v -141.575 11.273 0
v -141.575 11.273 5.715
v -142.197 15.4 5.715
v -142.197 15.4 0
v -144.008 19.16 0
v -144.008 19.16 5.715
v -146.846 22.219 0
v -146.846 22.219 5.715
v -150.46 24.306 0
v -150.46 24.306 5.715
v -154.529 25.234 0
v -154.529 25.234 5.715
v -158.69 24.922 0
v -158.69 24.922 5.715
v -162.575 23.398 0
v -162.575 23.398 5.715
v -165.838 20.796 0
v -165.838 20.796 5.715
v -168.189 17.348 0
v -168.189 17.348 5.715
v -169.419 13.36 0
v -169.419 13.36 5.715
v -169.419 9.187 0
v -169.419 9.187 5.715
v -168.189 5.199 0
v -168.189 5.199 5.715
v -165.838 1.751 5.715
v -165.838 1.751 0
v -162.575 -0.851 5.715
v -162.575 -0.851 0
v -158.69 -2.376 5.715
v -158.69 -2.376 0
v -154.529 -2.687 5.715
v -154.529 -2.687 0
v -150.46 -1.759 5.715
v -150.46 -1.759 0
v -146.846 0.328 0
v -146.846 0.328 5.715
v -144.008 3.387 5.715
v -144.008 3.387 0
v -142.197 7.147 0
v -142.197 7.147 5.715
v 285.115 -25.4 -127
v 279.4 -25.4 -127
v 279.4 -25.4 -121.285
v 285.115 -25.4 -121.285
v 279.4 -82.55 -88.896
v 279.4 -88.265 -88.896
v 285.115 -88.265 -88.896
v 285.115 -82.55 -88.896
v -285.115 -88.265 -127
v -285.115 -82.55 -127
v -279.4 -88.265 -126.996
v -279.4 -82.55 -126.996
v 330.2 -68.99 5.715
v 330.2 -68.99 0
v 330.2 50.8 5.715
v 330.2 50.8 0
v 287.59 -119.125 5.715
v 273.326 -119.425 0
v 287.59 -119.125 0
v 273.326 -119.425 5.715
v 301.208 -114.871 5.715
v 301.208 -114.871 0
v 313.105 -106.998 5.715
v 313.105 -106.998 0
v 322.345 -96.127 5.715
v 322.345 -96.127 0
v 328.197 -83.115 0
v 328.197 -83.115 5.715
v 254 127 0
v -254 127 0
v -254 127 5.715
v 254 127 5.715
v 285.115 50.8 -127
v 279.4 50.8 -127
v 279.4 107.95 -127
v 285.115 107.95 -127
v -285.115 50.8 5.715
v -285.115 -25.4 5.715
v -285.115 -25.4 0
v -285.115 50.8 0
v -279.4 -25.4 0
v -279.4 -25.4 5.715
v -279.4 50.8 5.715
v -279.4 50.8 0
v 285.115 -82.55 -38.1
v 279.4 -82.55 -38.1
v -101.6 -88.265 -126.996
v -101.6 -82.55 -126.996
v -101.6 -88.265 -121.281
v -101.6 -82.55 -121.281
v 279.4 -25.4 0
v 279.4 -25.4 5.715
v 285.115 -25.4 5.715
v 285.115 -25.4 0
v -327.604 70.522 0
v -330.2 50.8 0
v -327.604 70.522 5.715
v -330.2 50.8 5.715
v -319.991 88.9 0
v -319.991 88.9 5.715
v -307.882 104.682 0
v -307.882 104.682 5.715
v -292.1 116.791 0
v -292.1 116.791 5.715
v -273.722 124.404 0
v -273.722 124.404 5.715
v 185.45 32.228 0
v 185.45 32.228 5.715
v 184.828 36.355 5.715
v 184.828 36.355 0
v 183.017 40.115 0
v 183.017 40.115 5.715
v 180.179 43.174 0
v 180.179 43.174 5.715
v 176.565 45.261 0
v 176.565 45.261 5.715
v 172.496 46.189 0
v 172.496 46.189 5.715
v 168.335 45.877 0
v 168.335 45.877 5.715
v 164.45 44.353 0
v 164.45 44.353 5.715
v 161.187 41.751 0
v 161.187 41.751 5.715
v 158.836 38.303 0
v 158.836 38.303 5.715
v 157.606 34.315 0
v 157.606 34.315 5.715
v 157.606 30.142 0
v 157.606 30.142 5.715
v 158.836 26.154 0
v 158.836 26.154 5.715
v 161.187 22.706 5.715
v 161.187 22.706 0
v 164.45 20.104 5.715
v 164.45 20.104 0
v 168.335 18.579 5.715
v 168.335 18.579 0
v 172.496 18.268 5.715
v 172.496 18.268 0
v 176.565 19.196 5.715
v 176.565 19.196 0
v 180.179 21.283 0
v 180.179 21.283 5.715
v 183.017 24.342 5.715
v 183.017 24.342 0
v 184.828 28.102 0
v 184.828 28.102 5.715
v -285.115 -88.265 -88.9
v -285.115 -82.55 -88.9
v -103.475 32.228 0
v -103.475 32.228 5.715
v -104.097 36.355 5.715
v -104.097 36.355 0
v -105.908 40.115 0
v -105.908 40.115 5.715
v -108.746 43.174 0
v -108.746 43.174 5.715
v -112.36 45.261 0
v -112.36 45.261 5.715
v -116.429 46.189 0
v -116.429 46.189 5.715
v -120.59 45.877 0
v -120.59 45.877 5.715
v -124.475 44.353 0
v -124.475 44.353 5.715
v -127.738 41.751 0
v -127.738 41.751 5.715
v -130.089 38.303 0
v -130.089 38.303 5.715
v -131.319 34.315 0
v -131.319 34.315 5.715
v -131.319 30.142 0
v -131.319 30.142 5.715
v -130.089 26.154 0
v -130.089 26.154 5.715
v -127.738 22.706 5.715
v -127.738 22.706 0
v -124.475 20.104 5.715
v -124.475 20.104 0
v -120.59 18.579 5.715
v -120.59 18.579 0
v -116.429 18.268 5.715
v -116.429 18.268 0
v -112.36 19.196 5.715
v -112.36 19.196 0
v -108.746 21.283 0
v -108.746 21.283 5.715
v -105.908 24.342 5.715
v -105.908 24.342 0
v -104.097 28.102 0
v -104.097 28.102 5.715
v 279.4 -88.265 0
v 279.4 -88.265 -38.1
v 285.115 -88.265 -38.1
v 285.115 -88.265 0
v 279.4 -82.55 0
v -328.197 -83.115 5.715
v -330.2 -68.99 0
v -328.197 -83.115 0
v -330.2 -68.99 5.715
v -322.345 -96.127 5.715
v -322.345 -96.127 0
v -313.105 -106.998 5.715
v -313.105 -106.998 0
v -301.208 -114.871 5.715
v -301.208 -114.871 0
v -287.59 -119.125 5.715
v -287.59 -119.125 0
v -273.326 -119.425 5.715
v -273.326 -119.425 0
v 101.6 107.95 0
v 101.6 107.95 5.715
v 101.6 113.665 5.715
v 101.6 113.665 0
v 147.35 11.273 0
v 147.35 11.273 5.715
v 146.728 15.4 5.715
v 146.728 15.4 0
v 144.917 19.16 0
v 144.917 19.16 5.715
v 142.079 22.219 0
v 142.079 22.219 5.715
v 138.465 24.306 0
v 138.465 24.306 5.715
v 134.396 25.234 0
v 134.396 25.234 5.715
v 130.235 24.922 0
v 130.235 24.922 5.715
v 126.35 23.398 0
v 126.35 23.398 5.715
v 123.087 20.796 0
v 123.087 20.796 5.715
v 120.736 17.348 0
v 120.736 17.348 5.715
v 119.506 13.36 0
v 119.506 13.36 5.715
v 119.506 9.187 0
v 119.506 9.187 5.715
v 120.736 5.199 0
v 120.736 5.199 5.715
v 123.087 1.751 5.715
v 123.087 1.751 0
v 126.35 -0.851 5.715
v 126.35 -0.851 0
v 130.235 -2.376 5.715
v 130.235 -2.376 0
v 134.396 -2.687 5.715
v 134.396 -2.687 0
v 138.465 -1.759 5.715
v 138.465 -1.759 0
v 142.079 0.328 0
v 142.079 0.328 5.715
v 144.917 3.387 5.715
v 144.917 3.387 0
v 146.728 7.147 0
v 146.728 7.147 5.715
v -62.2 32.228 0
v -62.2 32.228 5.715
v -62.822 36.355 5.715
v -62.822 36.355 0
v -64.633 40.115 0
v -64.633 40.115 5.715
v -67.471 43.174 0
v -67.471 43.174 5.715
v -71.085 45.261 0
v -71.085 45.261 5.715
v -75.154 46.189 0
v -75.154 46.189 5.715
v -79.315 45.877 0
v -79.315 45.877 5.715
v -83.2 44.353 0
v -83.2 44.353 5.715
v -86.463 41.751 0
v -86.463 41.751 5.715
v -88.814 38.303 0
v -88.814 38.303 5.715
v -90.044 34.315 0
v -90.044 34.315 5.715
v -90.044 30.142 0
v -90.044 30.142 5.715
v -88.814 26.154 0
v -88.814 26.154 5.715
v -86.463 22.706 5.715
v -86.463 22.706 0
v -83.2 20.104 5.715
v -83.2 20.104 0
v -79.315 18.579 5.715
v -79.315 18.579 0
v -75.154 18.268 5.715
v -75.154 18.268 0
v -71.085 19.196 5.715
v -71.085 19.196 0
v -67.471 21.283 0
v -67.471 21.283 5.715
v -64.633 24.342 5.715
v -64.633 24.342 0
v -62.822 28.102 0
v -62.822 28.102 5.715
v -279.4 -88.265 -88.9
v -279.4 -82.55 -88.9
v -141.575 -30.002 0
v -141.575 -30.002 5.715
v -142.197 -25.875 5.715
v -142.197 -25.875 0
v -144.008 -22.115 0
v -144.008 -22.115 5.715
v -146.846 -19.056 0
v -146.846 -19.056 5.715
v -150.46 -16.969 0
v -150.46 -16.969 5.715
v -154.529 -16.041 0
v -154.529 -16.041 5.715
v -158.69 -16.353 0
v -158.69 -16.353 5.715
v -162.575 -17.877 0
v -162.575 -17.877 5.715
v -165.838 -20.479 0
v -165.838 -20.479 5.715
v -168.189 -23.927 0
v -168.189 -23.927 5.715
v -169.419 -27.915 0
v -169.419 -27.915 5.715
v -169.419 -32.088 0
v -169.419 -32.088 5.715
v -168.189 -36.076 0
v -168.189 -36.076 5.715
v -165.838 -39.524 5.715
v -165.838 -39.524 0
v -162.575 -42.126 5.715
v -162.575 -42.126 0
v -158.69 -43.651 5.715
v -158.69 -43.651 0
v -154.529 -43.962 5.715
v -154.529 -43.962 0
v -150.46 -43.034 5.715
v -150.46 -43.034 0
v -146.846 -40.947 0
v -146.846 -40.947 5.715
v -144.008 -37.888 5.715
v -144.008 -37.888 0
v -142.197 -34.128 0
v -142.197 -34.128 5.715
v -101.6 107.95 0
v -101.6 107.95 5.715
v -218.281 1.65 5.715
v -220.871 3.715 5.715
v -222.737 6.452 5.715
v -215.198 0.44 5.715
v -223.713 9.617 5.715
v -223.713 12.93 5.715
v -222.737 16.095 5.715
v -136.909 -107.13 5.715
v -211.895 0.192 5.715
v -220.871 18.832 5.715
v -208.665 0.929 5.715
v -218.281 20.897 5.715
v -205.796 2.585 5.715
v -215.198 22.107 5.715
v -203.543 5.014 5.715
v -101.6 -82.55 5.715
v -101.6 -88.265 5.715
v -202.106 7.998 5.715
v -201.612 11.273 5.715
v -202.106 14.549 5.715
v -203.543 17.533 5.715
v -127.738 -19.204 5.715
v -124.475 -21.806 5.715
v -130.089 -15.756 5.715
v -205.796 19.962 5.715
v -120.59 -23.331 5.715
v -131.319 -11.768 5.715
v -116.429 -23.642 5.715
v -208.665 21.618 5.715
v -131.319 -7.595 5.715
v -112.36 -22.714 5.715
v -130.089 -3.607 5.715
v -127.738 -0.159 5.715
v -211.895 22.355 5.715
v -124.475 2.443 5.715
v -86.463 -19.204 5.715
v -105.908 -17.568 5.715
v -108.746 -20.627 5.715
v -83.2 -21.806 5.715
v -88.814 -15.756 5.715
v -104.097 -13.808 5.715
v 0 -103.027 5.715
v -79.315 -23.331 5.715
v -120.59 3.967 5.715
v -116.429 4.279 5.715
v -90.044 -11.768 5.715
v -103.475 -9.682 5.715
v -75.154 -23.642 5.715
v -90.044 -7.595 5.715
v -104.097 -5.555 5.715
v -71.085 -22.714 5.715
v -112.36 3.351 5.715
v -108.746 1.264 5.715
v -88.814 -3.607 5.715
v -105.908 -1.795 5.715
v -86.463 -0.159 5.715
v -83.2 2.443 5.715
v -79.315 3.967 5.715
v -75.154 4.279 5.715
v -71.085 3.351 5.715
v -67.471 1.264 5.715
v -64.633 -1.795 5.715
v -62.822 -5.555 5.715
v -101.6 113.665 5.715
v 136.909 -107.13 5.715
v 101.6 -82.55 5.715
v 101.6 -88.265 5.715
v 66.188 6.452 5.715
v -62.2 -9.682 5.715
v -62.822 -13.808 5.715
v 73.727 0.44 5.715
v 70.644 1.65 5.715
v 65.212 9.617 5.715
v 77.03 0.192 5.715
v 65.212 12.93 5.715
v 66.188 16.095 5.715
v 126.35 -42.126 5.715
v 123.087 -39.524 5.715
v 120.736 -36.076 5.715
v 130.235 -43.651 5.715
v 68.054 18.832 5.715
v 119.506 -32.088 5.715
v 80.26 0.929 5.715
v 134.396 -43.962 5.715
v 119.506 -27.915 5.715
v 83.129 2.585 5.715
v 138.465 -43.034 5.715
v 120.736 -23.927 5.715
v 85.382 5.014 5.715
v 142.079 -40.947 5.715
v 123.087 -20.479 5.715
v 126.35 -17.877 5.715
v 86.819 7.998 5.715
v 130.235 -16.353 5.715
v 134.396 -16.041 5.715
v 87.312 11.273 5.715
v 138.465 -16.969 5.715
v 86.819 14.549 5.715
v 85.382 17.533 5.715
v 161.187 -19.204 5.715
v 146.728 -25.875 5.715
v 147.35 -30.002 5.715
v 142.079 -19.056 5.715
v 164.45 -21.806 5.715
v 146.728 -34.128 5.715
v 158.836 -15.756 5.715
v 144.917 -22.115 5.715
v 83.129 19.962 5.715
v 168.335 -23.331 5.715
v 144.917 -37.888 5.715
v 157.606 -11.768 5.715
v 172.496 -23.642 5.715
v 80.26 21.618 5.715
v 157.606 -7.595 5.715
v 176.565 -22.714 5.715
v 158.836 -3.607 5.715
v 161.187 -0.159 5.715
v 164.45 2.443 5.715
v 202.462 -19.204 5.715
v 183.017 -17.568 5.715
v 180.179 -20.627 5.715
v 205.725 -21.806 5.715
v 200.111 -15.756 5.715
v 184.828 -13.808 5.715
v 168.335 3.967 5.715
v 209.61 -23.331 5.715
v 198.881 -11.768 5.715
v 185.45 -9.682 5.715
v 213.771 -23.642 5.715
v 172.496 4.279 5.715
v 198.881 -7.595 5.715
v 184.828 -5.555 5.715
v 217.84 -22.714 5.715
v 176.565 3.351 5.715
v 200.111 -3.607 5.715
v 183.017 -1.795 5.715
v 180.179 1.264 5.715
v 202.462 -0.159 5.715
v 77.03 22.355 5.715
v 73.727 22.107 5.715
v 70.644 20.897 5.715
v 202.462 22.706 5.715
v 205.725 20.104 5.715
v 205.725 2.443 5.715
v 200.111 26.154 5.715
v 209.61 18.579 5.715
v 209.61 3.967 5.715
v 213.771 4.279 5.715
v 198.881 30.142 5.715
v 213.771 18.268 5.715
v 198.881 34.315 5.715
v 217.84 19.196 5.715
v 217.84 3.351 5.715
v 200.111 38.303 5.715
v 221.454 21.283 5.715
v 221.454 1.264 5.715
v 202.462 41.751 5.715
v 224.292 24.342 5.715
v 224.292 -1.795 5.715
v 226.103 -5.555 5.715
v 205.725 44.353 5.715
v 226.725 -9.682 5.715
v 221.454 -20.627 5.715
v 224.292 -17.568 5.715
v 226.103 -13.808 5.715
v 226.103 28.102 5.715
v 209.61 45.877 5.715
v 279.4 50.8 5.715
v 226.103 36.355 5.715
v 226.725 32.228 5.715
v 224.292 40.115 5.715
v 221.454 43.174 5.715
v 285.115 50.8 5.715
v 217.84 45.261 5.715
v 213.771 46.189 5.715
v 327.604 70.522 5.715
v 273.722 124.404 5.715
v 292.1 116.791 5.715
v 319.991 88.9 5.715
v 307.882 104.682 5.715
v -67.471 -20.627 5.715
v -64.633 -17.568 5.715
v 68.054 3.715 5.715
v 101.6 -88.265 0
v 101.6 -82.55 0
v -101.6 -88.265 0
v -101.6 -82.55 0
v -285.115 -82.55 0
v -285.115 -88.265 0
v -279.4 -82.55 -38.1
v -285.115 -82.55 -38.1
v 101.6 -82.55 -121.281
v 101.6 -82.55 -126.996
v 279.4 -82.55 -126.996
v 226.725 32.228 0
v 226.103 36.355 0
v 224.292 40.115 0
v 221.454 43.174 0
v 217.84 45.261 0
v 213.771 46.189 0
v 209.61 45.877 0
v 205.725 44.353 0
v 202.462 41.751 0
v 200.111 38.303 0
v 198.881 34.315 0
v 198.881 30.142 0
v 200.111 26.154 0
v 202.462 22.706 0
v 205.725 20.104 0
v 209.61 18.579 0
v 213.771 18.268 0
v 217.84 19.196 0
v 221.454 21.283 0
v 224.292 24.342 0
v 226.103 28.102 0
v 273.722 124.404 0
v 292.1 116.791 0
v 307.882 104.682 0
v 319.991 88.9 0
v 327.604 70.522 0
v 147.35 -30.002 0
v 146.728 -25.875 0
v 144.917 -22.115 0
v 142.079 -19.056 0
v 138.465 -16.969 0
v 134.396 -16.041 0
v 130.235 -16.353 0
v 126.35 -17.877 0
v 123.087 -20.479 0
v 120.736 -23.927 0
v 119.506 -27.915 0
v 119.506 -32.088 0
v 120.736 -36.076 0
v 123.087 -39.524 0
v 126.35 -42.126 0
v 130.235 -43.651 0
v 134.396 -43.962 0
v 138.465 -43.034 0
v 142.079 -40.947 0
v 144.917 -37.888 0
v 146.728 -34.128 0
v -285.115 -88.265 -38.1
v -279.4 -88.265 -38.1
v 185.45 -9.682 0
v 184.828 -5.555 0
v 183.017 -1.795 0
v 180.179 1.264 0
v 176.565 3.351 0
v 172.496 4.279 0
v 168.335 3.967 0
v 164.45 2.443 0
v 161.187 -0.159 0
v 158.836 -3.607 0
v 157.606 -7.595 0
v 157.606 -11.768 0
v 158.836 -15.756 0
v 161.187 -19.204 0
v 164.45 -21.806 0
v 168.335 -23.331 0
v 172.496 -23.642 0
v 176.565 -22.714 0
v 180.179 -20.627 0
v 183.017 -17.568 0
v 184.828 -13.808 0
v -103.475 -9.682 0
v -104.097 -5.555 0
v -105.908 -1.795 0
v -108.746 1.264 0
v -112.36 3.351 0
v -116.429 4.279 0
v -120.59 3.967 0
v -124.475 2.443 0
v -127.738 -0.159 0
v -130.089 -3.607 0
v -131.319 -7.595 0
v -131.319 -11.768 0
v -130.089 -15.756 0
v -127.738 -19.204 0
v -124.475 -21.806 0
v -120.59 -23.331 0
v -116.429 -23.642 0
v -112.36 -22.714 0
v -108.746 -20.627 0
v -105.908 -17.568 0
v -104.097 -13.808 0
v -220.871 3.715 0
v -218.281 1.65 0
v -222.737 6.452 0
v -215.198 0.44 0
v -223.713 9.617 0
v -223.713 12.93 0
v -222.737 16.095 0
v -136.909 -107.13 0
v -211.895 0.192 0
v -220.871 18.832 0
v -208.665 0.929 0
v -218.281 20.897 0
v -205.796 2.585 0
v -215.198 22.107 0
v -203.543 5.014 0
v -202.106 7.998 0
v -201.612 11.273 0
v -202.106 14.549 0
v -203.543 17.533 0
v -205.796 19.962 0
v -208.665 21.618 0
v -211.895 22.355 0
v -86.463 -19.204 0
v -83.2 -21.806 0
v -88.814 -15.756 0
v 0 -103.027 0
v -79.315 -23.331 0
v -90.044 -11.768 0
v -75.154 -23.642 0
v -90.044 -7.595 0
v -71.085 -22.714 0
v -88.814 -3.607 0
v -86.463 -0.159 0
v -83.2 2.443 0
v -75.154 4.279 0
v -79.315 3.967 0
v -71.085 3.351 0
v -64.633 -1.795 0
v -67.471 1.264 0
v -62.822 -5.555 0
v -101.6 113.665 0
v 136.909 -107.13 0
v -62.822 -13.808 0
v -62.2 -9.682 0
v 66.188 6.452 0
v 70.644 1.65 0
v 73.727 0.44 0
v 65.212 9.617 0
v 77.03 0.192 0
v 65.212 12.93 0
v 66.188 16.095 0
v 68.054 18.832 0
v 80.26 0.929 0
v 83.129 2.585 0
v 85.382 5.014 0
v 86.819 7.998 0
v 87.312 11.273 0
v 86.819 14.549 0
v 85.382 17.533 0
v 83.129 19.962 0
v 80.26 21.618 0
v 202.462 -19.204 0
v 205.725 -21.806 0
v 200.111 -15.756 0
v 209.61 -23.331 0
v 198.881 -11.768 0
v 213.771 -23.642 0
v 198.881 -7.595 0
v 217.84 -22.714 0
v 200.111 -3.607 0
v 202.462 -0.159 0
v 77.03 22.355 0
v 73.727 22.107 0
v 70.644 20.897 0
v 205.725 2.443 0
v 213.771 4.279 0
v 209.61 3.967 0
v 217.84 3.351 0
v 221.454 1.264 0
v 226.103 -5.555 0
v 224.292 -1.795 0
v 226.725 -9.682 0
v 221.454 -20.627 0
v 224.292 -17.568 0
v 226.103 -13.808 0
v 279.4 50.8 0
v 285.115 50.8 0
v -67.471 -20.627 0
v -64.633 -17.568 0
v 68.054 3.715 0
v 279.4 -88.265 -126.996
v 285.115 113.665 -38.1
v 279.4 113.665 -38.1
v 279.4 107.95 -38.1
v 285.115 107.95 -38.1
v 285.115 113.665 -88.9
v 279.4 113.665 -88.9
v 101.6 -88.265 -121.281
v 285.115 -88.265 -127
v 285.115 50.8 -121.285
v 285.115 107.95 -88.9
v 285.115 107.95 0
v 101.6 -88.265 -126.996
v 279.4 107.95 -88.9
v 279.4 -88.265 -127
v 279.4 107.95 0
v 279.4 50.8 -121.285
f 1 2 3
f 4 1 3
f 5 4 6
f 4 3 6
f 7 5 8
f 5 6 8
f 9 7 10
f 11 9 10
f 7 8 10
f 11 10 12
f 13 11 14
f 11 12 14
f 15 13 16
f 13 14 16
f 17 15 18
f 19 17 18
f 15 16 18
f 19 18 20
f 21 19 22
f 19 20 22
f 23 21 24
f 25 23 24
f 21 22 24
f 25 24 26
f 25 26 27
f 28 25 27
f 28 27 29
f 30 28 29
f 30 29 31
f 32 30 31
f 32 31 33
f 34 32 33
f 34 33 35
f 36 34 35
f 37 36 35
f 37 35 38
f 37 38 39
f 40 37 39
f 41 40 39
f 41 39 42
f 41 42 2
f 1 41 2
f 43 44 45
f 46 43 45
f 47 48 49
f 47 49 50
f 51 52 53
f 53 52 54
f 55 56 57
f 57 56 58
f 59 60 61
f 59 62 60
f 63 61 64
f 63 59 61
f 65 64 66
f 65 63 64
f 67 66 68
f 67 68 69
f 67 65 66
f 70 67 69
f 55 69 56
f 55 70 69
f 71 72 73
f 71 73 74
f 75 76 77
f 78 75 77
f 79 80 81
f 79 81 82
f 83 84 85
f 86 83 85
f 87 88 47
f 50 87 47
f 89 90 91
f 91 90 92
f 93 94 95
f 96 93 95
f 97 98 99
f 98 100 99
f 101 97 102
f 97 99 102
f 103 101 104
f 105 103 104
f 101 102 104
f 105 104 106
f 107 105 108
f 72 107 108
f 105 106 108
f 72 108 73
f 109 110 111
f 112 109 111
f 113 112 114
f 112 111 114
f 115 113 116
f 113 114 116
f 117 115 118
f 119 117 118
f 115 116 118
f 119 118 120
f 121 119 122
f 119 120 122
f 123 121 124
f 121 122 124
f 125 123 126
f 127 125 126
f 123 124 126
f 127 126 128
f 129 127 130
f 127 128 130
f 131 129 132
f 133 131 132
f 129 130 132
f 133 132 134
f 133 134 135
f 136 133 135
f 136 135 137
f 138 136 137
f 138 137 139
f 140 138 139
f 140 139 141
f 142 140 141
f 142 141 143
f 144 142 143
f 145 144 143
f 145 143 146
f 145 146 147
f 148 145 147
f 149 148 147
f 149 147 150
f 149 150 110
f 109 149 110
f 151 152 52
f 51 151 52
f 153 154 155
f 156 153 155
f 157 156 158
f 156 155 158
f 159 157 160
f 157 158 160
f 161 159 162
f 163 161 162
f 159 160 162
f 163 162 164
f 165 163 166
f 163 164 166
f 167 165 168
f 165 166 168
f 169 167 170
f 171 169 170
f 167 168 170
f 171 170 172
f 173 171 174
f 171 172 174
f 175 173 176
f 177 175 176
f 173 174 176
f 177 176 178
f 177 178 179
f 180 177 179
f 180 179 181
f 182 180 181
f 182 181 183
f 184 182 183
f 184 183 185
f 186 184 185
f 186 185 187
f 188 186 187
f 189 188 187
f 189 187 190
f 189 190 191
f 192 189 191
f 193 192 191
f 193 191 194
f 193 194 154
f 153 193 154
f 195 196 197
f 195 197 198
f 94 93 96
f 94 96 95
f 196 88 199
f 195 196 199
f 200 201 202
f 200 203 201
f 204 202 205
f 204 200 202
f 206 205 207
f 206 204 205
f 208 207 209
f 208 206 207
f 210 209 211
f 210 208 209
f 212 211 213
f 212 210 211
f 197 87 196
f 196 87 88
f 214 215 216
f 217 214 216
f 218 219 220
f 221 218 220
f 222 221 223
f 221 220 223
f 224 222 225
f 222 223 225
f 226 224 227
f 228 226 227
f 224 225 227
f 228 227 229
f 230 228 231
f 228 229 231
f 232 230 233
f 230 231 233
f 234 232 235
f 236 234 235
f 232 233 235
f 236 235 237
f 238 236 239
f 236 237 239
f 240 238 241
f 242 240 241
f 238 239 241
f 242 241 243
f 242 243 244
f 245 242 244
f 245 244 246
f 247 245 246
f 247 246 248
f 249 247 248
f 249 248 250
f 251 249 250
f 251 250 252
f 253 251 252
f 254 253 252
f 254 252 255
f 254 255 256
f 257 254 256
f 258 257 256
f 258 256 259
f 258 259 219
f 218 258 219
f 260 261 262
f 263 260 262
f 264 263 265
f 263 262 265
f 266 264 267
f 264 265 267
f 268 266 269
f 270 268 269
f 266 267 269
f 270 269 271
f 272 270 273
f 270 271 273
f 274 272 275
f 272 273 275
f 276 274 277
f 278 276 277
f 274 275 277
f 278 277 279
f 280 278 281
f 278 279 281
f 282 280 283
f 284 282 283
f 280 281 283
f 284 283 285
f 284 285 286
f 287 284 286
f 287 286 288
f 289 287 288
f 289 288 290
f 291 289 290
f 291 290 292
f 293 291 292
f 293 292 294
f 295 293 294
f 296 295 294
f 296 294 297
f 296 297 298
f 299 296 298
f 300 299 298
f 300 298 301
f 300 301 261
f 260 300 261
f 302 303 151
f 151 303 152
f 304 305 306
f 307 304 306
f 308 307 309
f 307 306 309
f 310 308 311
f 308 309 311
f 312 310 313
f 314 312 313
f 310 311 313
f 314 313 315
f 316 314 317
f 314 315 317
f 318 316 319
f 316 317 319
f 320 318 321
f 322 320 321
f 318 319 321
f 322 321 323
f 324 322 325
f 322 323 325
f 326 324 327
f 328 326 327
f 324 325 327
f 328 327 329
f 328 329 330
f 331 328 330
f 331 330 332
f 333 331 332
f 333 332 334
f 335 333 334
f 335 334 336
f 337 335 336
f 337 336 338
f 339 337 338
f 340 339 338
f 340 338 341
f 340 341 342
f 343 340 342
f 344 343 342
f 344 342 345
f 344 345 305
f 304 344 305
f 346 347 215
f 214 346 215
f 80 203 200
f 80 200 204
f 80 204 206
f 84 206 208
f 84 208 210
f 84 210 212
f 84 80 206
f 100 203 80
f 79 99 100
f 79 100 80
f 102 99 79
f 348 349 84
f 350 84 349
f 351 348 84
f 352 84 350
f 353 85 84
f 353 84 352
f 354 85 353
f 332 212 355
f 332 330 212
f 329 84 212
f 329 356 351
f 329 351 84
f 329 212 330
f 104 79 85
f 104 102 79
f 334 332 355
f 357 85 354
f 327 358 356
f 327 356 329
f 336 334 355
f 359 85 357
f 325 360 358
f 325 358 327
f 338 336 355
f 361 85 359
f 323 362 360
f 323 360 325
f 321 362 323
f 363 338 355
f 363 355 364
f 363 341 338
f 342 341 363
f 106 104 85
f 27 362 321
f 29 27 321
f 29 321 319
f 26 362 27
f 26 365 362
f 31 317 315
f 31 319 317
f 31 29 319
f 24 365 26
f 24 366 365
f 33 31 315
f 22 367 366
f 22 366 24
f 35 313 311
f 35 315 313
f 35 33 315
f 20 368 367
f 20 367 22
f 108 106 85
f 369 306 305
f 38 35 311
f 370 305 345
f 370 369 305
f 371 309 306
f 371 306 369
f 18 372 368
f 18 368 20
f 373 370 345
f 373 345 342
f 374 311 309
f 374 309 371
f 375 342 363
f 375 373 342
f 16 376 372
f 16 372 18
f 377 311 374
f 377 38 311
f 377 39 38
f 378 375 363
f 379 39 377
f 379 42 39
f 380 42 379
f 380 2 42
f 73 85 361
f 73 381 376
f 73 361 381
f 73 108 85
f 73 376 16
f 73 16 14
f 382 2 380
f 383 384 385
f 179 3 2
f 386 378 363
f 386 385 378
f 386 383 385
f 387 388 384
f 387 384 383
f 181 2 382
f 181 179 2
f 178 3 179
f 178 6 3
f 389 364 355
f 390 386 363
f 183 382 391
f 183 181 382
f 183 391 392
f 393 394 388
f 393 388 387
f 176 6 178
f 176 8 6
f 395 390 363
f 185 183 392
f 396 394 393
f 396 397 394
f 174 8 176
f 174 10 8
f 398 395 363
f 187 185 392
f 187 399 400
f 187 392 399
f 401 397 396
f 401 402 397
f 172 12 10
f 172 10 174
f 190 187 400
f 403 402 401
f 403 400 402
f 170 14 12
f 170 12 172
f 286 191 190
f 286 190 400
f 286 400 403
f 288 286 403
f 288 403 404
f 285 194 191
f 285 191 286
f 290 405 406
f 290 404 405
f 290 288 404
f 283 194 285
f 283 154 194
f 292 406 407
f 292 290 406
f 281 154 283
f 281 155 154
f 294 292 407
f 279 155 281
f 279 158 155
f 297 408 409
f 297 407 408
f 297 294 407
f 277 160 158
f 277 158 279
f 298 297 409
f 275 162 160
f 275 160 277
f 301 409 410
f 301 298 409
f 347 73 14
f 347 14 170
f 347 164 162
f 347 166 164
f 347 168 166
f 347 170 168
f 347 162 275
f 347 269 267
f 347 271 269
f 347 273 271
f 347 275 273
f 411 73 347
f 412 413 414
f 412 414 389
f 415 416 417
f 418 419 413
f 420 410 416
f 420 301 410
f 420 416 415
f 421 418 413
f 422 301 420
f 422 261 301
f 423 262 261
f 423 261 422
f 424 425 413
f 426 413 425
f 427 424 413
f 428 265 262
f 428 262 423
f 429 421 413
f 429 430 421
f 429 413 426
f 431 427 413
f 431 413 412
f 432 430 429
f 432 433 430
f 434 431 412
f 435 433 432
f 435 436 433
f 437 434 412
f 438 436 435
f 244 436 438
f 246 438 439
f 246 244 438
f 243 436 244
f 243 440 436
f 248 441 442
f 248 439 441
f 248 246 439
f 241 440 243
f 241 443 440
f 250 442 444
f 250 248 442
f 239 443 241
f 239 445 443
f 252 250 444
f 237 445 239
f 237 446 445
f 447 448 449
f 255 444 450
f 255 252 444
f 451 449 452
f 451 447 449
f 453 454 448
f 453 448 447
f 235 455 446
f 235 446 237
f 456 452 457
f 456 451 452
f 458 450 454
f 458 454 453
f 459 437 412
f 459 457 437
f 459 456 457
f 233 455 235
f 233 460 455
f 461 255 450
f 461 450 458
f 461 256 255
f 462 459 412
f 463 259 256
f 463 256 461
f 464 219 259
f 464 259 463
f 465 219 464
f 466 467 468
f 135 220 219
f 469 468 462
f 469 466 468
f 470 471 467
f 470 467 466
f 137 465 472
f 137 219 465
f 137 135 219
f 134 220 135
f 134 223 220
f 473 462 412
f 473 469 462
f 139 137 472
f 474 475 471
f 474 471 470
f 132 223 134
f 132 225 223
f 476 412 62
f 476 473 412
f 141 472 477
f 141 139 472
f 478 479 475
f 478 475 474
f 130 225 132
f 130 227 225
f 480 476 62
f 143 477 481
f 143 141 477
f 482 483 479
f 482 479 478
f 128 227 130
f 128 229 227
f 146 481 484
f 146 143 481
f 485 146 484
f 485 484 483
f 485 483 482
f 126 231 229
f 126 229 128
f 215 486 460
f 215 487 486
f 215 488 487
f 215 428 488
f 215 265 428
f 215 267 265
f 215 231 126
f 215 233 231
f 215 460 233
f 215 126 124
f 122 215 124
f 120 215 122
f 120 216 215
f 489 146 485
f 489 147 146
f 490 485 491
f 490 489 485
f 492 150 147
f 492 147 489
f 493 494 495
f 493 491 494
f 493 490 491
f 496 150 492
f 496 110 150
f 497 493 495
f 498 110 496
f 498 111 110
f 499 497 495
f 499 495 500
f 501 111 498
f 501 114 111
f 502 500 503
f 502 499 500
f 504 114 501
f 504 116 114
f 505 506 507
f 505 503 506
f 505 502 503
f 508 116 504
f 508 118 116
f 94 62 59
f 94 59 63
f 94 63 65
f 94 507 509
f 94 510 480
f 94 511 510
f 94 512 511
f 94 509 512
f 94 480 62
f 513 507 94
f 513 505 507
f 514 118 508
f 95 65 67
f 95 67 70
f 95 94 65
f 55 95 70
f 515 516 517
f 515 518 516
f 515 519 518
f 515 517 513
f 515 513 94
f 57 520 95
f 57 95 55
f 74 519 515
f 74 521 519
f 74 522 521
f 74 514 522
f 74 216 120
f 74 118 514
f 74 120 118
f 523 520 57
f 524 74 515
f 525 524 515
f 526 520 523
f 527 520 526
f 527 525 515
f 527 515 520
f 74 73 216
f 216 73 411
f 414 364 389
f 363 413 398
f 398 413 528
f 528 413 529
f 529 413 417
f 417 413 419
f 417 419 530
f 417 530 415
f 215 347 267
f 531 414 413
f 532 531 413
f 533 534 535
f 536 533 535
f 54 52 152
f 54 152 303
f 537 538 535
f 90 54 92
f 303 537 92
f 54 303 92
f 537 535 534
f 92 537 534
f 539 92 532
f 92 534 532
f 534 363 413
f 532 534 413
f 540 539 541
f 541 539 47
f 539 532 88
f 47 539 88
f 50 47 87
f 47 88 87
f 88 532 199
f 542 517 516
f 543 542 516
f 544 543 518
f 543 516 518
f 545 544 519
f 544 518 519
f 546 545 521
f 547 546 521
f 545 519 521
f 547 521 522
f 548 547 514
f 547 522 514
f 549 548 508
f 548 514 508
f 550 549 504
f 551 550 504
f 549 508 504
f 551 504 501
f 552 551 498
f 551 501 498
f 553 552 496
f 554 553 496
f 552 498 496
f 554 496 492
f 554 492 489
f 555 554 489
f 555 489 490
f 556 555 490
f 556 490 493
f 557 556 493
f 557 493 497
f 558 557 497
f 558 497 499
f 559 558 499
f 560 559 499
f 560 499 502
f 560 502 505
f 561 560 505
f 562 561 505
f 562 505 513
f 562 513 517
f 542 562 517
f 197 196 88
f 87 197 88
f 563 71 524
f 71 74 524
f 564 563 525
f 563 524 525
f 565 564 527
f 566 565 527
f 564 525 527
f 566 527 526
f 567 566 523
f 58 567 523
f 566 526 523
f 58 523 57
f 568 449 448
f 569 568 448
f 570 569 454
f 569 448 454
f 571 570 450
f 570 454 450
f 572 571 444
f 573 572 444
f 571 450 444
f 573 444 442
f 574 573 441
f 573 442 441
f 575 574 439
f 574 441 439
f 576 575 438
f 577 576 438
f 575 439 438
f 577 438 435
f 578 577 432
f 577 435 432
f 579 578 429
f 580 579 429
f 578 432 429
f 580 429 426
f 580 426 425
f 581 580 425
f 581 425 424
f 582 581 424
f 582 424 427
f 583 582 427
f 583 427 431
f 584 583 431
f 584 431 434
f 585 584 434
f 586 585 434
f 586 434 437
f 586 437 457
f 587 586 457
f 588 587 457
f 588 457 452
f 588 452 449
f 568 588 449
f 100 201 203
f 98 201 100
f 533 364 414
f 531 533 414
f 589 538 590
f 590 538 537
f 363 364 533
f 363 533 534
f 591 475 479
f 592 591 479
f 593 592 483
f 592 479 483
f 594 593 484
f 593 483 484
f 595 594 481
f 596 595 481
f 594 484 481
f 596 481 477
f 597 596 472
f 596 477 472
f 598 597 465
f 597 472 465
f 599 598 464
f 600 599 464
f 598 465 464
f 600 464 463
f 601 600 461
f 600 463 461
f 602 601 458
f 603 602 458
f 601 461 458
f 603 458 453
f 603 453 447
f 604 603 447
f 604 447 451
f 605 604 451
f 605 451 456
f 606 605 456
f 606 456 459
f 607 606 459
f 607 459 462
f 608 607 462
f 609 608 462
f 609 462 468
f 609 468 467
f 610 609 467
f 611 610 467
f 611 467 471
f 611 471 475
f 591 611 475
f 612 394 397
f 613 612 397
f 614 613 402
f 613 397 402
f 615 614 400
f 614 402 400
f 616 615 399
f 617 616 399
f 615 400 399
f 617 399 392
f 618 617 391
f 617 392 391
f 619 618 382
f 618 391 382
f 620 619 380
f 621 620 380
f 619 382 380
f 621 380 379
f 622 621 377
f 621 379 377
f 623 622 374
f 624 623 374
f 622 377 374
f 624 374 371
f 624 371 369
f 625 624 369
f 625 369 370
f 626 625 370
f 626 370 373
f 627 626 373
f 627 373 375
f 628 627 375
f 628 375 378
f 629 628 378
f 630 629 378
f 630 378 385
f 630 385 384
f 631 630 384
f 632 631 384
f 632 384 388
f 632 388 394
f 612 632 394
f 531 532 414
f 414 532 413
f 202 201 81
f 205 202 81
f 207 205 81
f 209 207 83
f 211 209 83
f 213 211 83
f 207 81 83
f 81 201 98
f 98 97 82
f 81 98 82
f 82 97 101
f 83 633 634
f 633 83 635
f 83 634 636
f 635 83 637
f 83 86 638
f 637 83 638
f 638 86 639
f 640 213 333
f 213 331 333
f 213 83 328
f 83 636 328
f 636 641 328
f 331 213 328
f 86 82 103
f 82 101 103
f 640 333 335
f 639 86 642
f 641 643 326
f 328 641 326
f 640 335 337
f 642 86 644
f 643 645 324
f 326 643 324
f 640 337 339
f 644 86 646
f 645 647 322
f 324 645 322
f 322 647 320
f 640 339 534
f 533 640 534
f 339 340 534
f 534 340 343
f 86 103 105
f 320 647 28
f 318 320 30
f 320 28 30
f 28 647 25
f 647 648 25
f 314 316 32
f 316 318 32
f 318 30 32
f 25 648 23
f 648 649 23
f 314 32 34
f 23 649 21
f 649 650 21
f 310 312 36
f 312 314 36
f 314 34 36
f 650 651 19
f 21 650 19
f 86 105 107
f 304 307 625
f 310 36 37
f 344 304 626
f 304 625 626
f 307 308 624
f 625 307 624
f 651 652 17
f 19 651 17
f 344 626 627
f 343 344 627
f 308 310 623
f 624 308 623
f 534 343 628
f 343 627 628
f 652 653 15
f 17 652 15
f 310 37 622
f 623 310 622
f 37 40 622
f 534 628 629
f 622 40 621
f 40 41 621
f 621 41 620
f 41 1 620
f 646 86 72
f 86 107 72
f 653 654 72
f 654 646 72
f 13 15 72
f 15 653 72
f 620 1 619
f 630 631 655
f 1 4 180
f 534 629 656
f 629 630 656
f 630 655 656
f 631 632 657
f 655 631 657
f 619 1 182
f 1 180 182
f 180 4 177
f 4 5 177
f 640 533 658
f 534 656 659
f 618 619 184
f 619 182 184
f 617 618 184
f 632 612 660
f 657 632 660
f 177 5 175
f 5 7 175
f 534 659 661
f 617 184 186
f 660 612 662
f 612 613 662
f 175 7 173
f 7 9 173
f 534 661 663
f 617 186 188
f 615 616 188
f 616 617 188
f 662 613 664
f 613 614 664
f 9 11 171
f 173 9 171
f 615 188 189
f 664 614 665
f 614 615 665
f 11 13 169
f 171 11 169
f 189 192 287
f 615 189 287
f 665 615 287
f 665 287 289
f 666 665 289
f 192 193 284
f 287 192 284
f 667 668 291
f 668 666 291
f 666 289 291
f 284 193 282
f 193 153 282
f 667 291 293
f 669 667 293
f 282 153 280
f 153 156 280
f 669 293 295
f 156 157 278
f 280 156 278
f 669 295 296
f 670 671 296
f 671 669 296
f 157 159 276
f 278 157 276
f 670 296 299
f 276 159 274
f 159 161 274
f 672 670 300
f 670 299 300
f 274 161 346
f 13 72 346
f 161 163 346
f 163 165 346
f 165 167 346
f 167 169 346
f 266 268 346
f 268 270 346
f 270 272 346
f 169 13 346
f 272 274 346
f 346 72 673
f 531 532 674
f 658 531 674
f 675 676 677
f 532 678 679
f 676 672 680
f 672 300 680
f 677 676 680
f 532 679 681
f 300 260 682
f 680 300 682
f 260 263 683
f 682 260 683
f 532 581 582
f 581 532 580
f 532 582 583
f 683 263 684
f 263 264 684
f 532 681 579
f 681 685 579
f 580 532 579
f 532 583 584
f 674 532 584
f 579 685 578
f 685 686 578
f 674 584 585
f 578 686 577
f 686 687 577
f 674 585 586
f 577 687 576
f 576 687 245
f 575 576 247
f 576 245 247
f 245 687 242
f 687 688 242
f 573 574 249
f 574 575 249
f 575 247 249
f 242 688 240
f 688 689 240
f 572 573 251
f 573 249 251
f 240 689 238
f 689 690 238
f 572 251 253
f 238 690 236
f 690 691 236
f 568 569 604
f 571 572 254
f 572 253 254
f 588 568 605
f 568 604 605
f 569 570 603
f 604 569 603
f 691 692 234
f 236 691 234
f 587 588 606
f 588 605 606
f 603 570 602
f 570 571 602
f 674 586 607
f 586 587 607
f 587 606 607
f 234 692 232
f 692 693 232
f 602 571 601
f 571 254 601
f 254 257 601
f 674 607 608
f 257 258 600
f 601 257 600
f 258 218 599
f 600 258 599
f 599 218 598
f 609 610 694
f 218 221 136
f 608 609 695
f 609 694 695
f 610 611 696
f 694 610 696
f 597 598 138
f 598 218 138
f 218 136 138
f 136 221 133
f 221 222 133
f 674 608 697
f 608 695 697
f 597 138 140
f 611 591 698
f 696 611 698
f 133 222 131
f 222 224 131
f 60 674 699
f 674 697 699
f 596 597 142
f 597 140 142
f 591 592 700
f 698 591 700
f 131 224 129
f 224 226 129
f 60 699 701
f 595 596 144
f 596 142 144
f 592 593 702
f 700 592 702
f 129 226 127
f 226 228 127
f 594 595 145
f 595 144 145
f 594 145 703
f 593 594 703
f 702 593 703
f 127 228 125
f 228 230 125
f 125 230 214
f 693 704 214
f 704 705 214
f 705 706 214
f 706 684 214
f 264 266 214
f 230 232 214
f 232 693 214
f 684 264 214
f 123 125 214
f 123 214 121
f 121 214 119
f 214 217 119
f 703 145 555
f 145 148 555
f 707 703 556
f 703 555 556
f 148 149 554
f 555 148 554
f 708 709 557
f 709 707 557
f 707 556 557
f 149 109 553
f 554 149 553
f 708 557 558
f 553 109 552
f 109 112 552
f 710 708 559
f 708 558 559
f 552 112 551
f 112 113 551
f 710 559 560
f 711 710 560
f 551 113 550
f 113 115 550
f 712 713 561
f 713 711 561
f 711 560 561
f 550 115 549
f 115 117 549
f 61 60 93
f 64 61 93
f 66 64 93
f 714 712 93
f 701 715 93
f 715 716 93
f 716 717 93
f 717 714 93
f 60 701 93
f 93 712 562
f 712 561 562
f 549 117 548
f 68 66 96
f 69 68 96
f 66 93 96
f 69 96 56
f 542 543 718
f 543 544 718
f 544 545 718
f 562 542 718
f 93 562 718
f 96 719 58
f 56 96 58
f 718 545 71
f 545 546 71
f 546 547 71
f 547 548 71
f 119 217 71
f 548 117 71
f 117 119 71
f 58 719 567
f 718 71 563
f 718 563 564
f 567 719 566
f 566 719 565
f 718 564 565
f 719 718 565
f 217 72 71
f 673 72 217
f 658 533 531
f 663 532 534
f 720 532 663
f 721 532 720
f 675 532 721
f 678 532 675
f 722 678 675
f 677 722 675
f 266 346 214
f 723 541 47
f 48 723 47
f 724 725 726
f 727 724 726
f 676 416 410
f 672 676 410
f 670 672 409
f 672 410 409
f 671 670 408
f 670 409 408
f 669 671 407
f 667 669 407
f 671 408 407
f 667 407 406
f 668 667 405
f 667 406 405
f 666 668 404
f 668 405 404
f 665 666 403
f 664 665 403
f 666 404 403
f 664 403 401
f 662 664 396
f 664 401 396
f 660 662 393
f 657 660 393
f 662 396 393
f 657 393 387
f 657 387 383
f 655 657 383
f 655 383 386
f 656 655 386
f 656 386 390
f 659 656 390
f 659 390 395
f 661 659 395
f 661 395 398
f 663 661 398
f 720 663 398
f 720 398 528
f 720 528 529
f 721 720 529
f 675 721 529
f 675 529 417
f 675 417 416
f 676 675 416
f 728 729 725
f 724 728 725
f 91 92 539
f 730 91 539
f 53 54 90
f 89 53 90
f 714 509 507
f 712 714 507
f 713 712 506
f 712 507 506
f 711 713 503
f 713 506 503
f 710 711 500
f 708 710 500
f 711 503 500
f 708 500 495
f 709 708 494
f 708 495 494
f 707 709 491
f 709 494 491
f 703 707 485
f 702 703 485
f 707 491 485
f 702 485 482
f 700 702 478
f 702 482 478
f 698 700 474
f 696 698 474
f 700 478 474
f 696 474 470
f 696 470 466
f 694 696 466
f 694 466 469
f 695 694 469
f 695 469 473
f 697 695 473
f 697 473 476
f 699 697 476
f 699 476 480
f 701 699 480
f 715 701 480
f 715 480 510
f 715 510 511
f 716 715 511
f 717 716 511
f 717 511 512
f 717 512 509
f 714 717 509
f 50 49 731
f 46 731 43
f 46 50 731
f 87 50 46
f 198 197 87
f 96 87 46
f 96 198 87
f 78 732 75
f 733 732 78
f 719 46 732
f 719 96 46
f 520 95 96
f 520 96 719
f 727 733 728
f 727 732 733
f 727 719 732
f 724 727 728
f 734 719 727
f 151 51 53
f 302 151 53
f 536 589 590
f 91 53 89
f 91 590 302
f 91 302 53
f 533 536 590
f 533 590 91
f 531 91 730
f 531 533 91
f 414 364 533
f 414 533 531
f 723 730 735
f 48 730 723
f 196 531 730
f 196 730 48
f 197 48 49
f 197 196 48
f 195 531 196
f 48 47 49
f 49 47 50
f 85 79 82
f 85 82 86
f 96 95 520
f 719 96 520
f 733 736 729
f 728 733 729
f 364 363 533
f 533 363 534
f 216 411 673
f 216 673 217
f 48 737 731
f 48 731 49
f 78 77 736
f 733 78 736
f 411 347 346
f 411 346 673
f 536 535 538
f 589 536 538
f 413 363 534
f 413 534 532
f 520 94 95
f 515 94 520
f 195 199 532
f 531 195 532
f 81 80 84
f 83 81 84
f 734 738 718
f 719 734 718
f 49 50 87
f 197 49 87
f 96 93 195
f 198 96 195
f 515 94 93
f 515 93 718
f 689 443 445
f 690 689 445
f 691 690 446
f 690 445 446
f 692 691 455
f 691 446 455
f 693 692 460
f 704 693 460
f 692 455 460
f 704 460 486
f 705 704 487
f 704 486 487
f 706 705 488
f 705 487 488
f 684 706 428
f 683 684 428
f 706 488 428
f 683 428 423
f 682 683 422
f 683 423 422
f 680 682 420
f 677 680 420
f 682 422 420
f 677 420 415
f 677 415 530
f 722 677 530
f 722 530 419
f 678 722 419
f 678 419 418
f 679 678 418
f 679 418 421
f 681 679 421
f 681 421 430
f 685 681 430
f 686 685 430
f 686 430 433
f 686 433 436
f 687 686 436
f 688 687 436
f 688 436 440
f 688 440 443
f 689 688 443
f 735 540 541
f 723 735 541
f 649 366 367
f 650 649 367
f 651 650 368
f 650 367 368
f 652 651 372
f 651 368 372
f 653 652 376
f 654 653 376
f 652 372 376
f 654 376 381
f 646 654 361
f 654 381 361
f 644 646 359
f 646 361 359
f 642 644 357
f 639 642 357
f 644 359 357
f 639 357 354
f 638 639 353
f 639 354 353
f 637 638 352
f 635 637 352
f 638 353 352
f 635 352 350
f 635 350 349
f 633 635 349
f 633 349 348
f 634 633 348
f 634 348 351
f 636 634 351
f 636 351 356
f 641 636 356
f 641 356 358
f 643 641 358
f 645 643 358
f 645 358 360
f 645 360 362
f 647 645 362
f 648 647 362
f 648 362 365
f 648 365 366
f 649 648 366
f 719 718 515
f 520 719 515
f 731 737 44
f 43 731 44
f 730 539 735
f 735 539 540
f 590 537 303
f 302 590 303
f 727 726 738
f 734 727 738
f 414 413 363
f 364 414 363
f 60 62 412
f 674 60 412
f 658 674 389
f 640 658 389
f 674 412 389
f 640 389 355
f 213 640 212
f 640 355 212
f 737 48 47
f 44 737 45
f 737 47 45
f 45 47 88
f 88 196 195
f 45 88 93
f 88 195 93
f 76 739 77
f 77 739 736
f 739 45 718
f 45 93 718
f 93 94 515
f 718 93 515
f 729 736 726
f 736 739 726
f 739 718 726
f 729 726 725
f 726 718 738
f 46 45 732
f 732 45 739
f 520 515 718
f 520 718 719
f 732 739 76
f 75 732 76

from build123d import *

# Parameters (mm, degrees)
F0_W      = 660.4
F0_H      = 254
F1_DEPTH  = 5.715
F3_DEPTH  = 5.716
F5_R      = 50.8
F6_R      = 11.1125
F6_R_2    = 14
F7_DEPTH  = 5.716
F8_R      = 76.2
F12_DEPTH = 5.715
F14_W     = 5.715
F14_H     = 38.1037298436
F14_W_2   = 76.2
F14_H_2   = 5.715
F14_H_3   = 38.1
F15_DEPTH = 5.715
F16_W     = 203.2
F16_H     = 5.715
F16_W_2   = 5.715
F16_H_2   = 76.2
F17_DEPTH = 25.4


with BuildPart() as f1:
    # F0 (on Top) → F1 (new body)
    with BuildSketch(Plane.XY):
        Rectangle(F0_W, F0_H)
    extrude(amount=F1_DEPTH)

    # F2 (on face) → F3 (cut, through all)
    with BuildSketch(Plane.XY.offset(5.715)):
        with BuildLine():
            Line((-330.2, -127), (330.2, -127))
            ThreePointArc((330.2, -127), (0, -103.0265162018), (-330.2, -127))
        make_face()
    extrude(amount=-F3_DEPTH, mode=Mode.SUBTRACT)

    # F5
    f5_edges = [f1.edges().sort_by_distance(p)[0] for p in [
        (-330.2, -127, 2.8575),
        (330.2, -127, 2.8575),
    ]]
    fillet(f5_edges, radius=F5_R)

    # F6 (on face) → F7 (cut, through all)
    with BuildSketch(Plane.XY.offset(5.715)):
        with Locations((-212.725, 11.2734837982)):
            Circle(F6_R)
        with Locations((76.2, 11.2734837982)):
            Circle(F6_R)
        with Locations((-117.475, 32.2284837982)):
            Circle(F6_R_2)
        with Locations((-117.475, -9.6815162018)):
            Circle(F6_R_2)
        with Locations((-155.575, 11.2734837982)):
            Circle(F6_R_2)
        with Locations((-155.575, -30.0015162018)):
            Circle(F6_R_2)
        with Locations((-76.2, -9.6815162018)):
            Circle(F6_R_2)
        with Locations((-76.2, 32.2284837982)):
            Circle(F6_R_2)
        with Locations((171.45, 32.2284837982)):
            Circle(F6_R_2)
        with Locations((212.725, 32.2284837982)):
            Circle(F6_R_2)
        with Locations((212.725, -9.6815162018)):
            Circle(F6_R_2)
        with Locations((171.45, -9.6815162018)):
            Circle(F6_R_2)
        with Locations((133.35, 11.2734837982)):
            Circle(F6_R_2)
        with Locations((133.35, -30.0015162018)):
            Circle(F6_R_2)
    extrude(amount=-F7_DEPTH, mode=Mode.SUBTRACT)

    # F8
    f8_edges = [f1.edges().sort_by_distance(p)[0] for p in [
        (-330.2, 127, 2.8575),
        (330.2, 127, 2.8575),
    ]]
    fillet(f8_edges, radius=F8_R)

    # F16 (on face) → F17 (cut)
    with BuildSketch(Plane.XY.offset(5.715)):
        with Locations((0, -85.4075)):
            Rectangle(F16_W, F16_H)
        with Locations((0, 110.8075)):
            Rectangle(F16_W, F16_H)
        with Locations((282.2575, 12.7)):
            Rectangle(F16_W_2, F16_H_2)
        with Locations((-282.2575, 12.7)):
            Rectangle(F16_W_2, F16_H_2)
    extrude(amount=-F17_DEPTH, mode=Mode.SUBTRACT)


with BuildPart() as f12:
    # F11 (on offset) → F12 (new body)
    with BuildSketch(Plane.XZ.offset(82.55)):
        Polygon((-285.115, -127), (-279.4, -126.9962701564), (-101.6, -126.9962701564), (-101.6, -121.2812701564), (101.6, -121.2812701564), (101.6, -126.9962701564), (279.4, -126.9962701564), (279.4, -88.8962701564), (285.115, -88.8962701564), (285.115, -38.1), (279.4, -38.1), (279.4, 0), (101.6, 0), (101.6, 5.715), (-101.6, 5.715), (-101.6, 0), (-279.4, 0), (-285.115, 0), (-285.115, -38.1), (-279.4, -38.1), (-279.4, -88.9), (-285.115, -88.9), align=None)
    extrude(amount=F12_DEPTH)


with BuildPart() as f15:
    # F14 (on offset) → F15 (new body)
    with BuildSketch(Plane.YZ.offset(279.4)):
        Polygon((50.8, -127), (107.95, -127), (107.95, -88.9), (113.665, -88.9), (113.665, -38.1), (107.95, -38.1), (107.95, 0), (50.8, 0), (-25.4, 0), (-82.55, 0), (-82.55, -38.1), (-82.55, -88.8962701564), (-82.55, -127), (-25.4, -127), (-25.4, -121.285), (50.8, -121.285), align=None)
        with Locations((-85.4075, -107.9481350782)):
            Rectangle(F14_W, F14_H)
        with Locations((12.7, 2.8575)):
            Rectangle(F14_W_2, F14_H_2)
        with Locations((-85.4075, -19.05)):
            Rectangle(F14_W, F14_H_3)
    extrude(amount=F15_DEPTH)


solid = Compound([f1.part, f12.part, f15.part])
